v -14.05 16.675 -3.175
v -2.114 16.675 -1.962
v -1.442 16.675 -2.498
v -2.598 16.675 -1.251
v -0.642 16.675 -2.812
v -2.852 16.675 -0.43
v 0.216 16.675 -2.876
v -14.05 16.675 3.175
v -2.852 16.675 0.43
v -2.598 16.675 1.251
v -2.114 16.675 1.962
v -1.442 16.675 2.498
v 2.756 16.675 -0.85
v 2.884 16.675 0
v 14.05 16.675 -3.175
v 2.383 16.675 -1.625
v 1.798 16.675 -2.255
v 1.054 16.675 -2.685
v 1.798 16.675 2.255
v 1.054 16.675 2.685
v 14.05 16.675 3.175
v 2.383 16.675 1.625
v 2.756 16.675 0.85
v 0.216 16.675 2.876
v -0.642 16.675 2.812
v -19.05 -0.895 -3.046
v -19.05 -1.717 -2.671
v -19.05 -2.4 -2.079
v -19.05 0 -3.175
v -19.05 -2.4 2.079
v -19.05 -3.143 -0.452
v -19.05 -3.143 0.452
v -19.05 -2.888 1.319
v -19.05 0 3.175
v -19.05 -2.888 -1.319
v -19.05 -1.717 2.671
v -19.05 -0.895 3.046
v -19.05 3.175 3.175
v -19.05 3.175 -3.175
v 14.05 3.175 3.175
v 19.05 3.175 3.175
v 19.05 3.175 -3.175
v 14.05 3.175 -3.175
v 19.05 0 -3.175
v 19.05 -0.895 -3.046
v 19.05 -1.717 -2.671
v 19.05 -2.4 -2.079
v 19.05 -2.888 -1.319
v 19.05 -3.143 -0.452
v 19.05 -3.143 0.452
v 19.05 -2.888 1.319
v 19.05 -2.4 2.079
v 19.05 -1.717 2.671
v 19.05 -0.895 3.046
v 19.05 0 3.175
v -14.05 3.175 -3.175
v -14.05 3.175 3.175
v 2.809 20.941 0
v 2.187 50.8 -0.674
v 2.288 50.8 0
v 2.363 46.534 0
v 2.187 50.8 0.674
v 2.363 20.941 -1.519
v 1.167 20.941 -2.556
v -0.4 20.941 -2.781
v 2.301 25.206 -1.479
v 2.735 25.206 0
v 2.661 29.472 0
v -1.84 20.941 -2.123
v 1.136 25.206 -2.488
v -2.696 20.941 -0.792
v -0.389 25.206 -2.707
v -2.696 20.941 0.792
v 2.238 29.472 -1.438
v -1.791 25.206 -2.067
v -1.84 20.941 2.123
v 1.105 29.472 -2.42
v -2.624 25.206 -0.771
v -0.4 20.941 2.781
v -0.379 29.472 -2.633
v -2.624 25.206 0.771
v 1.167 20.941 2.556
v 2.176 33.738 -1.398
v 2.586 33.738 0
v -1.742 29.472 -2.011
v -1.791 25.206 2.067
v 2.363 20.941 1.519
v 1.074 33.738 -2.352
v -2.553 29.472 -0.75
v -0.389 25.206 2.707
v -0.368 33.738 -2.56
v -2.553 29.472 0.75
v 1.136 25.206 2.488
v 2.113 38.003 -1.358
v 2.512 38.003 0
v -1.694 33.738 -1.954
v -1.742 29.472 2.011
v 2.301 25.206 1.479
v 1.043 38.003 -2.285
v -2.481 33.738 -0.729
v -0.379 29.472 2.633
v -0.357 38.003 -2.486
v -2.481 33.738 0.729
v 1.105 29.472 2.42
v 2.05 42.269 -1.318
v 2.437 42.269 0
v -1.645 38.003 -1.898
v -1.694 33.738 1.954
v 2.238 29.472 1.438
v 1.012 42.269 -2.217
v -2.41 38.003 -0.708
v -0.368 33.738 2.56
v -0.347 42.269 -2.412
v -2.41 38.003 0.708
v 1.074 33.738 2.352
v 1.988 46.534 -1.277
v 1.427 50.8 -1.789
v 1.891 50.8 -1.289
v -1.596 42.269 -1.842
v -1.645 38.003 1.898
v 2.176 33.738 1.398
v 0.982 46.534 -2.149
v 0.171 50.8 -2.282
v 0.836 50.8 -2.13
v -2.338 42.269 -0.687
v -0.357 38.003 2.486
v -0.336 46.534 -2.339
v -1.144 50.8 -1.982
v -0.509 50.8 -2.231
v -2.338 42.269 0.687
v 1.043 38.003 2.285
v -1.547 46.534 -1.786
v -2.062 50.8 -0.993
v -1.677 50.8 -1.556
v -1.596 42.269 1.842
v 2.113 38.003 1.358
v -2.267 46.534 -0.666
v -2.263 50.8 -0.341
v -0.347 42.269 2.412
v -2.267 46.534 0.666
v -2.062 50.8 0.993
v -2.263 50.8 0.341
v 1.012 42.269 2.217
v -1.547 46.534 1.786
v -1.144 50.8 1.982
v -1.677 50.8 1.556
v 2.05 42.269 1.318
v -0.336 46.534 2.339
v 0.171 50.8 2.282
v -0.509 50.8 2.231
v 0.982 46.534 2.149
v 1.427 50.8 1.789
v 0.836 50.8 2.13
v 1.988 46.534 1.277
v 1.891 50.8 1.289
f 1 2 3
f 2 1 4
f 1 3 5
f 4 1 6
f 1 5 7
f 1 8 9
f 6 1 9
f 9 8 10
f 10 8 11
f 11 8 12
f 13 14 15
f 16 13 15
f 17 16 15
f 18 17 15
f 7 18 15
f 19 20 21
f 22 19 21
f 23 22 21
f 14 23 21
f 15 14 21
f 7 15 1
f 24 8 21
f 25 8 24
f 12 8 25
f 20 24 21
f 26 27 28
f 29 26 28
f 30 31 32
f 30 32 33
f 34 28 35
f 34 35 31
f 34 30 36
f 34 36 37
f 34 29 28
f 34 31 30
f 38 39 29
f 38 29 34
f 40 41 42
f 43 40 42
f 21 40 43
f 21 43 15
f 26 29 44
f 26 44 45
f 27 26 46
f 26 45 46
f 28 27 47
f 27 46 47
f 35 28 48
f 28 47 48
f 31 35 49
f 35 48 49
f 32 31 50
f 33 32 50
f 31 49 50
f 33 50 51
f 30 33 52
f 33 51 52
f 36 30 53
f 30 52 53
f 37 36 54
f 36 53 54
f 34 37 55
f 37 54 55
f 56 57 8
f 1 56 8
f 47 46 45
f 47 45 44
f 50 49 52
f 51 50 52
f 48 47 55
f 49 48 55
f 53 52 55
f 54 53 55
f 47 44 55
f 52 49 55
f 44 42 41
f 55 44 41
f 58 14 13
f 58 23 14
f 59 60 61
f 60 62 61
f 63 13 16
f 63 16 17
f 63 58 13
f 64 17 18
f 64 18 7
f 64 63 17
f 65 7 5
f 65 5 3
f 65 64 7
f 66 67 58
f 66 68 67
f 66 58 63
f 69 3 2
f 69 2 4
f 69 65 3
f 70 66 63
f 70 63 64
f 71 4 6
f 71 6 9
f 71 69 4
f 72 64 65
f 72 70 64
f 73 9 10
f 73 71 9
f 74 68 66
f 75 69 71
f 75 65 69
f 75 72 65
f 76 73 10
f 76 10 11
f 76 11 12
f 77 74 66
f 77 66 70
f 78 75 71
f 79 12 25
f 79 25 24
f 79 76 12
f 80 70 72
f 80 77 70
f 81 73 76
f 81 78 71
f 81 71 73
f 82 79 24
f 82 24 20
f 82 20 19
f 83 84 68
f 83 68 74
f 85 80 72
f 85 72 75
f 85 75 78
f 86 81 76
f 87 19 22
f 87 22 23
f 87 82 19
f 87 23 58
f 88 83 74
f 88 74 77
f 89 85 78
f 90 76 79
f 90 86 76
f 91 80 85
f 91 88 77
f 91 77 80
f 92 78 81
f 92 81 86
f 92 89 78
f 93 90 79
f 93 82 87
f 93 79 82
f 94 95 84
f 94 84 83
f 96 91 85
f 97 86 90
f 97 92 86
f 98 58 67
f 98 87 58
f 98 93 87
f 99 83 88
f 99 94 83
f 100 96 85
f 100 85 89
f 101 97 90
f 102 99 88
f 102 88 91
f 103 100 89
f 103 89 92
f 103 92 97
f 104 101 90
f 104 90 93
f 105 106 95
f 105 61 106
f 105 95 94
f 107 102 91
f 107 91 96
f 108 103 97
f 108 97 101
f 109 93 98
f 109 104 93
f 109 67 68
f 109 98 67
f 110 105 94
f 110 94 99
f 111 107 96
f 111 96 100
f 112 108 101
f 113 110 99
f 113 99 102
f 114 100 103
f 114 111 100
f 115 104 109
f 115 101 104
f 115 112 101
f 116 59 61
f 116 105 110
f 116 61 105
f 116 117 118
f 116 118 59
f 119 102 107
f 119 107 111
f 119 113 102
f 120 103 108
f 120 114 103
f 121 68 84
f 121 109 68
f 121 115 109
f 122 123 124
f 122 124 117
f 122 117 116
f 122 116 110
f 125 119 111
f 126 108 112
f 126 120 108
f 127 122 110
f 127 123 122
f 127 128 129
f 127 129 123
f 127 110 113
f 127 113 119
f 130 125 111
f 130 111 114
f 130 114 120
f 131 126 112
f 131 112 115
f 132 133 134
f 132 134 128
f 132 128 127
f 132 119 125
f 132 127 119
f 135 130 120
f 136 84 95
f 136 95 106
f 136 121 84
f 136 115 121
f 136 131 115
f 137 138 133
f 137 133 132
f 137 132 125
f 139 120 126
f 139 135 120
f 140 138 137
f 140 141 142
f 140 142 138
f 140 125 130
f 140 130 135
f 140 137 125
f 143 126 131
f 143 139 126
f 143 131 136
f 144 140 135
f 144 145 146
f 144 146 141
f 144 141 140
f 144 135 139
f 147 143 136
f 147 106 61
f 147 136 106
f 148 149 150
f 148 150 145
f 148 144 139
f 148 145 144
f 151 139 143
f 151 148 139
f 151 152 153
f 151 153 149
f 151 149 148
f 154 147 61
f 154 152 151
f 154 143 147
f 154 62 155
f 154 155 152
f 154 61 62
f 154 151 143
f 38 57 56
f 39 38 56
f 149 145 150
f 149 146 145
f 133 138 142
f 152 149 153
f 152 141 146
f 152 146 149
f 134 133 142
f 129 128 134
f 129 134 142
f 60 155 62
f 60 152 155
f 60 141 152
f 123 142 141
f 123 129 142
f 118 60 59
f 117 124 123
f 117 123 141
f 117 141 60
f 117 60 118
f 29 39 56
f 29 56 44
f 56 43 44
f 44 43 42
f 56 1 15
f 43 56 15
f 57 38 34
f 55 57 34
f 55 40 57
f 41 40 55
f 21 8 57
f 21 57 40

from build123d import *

# Parameters (mm, degrees)
BOSS_EXTRUDE1_DEPTH = 19.05
SKETCH2_R           = 3.175
BOSS_EXTRUDE2_DEPTH = 50.8
BOSS_EXTRUDE2_TAPER = 1
SKETCH3_W           = 28.1
SKETCH3_H           = 13.5
BOSS_EXTRUDE3_DEPTH = 3.175


with BuildPart() as part:
    # Sketch1 → Boss-Extrude1 (new body, symmetric)
    with BuildSketch(Plane(origin=(0, 0, 0), x_dir=(0, 0, -1), z_dir=(1, 0, 0))):
        with BuildLine():
            Line((-3.175, 0), (-3.175, 3.175))
            Line((-3.175, 3.175), (3.175, 3.175))
            Line((3.175, 3.175), (3.175, 0))
            ThreePointArc((3.175, 0), (0, -3.175), (-3.175, 0))
        make_face()
    extrude(amount=BOSS_EXTRUDE1_DEPTH, both=True)

    # Sketch2 → Boss-Extrude2 (add)
    with BuildSketch(Plane(origin=(0, 0, 0), x_dir=(1, 0, 0), z_dir=(0, 1, 0))):
        Circle(SKETCH2_R)
    extrude(amount=BOSS_EXTRUDE2_DEPTH, taper=BOSS_EXTRUDE2_TAPER)

    # Sketch3 → Boss-Extrude3 (add, symmetric)
    with BuildSketch(Plane.XY):
        with Locations((0, 9.925)):
            Rectangle(SKETCH3_W, SKETCH3_H)
    extrude(amount=BOSS_EXTRUDE3_DEPTH, both=True)


solid = part.part
